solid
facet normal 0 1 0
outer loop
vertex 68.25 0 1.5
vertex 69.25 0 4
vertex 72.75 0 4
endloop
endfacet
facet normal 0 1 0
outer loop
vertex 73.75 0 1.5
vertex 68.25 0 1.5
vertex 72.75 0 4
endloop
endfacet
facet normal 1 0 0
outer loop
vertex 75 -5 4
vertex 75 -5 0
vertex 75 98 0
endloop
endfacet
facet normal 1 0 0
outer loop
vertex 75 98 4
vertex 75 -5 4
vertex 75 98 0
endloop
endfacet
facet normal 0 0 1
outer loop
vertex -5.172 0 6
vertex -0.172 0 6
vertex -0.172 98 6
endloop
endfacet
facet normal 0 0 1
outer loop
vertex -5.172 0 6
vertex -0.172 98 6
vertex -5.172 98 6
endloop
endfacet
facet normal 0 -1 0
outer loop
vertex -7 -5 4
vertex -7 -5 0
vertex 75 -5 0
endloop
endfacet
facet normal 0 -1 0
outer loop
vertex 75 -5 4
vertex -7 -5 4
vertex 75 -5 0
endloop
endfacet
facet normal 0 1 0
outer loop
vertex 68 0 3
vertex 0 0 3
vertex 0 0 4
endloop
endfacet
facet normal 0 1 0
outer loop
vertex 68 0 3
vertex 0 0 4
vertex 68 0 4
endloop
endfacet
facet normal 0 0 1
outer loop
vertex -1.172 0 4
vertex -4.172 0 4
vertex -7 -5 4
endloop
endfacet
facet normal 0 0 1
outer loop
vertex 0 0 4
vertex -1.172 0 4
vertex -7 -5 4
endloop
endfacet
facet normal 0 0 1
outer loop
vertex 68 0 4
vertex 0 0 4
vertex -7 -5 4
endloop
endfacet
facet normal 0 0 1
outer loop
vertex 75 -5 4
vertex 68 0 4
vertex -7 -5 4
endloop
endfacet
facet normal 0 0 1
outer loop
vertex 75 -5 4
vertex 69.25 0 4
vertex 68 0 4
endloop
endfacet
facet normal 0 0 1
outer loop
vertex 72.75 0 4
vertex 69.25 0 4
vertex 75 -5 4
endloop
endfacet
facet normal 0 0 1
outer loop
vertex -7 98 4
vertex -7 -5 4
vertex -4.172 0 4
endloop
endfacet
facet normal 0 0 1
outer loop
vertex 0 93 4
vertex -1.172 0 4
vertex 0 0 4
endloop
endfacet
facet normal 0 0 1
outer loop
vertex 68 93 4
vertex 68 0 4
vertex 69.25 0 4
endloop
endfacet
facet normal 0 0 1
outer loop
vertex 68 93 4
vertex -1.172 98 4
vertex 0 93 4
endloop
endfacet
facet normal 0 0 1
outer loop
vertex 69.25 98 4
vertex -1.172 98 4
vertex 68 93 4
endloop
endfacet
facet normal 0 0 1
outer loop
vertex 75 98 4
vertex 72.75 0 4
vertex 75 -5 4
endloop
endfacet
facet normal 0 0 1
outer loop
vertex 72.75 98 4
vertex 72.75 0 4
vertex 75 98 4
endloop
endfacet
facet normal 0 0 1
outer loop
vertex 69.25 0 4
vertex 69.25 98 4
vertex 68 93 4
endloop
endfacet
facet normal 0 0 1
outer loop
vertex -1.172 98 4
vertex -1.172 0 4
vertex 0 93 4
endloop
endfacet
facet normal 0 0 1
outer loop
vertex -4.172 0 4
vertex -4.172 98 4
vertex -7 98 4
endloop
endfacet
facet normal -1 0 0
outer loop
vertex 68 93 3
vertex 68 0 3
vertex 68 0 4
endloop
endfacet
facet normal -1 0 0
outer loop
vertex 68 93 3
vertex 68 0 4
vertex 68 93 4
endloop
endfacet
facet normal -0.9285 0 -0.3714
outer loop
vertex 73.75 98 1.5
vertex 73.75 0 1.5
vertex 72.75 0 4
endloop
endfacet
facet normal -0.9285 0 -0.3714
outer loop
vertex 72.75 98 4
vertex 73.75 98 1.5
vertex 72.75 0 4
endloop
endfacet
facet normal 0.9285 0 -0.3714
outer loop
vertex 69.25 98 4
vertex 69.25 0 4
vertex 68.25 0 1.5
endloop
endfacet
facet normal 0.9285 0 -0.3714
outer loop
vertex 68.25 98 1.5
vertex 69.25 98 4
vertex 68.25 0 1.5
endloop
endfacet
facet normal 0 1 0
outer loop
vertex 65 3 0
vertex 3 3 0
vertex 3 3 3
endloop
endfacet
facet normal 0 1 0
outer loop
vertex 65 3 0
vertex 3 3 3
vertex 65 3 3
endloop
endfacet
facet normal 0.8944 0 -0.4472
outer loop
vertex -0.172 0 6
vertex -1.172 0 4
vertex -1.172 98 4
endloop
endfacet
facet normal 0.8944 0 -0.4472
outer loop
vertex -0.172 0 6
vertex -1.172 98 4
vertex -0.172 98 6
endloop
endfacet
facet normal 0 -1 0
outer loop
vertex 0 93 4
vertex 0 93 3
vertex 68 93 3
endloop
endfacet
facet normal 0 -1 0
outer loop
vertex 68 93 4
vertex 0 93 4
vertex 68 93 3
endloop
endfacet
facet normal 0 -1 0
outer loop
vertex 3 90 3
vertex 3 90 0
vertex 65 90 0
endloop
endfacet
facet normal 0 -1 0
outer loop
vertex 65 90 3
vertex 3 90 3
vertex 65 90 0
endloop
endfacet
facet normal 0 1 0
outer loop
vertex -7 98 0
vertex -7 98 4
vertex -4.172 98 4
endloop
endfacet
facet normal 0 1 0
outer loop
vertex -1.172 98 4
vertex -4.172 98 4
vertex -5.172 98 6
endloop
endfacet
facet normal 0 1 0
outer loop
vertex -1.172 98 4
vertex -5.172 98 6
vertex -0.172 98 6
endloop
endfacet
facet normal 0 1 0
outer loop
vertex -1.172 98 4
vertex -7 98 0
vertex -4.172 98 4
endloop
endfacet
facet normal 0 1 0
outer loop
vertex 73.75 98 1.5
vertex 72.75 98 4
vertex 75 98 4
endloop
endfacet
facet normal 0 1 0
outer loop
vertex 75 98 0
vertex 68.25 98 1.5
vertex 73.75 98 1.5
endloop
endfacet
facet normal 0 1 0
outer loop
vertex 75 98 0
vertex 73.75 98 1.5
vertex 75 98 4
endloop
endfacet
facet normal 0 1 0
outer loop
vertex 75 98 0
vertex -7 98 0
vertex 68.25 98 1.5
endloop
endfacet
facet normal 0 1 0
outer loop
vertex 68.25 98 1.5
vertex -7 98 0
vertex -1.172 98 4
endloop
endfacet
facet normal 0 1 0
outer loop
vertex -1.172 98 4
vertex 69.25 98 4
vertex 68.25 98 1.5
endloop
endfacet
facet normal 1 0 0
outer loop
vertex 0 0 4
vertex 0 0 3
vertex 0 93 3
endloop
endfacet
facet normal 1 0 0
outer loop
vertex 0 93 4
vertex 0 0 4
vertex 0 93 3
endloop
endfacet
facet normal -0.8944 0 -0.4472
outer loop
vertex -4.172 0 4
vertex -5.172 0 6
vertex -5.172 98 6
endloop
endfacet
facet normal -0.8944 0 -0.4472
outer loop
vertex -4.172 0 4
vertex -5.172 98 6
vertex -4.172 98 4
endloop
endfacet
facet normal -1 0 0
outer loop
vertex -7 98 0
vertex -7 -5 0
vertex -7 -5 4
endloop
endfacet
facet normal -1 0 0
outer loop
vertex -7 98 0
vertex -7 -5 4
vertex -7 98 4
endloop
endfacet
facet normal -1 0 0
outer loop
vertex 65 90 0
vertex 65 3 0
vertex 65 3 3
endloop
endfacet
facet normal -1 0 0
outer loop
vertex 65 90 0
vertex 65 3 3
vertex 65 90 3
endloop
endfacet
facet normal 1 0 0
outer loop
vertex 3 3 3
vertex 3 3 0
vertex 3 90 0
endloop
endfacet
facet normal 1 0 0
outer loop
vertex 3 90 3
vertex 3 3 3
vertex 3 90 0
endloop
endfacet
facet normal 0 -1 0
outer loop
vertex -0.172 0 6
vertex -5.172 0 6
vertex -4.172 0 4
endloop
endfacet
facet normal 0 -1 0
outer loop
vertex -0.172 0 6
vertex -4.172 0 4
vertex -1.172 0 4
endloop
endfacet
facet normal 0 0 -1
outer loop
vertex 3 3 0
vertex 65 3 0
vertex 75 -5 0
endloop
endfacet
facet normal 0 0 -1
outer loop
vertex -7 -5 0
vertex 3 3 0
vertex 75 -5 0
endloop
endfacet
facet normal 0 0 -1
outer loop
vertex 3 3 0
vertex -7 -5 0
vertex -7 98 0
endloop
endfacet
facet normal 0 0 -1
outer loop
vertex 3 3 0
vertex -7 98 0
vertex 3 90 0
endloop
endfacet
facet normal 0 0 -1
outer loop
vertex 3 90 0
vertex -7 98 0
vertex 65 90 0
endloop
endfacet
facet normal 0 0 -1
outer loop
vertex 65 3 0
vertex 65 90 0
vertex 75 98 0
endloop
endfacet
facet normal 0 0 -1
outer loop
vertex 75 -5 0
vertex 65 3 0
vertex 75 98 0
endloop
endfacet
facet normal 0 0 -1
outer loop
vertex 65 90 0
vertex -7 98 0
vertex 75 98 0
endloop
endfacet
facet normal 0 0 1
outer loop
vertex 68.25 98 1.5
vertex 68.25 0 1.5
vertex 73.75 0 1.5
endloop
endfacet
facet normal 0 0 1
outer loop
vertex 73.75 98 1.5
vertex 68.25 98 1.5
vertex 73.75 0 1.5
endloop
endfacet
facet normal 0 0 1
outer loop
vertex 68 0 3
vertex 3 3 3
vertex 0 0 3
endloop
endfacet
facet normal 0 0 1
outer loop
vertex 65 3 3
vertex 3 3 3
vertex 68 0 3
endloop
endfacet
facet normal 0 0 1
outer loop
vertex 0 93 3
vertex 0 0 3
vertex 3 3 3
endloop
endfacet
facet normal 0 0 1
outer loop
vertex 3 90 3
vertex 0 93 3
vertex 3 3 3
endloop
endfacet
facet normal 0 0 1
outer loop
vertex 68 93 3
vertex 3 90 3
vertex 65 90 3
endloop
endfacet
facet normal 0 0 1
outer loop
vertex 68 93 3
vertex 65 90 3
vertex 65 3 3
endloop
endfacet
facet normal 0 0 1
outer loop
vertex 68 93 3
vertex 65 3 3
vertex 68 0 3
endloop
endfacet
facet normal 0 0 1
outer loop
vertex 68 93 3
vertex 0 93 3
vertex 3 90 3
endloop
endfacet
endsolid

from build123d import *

# Parameters (mm, degrees)
F0_W     = 68
F0_H     = 93
F0_W_2   = 62
F0_H_2   = 87
F1_DEPTH = 3
F0_W_3   = 82
F0_H_3   = 103
F2_DEPTH = 4
F4_DEPTH = 98
F6_DEPTH = 98


with BuildPart() as f1:
    # F0 (on Top) → F1 (new body)
    with BuildSketch(Plane.XY):
        with Locations((34, 46.5)):
            Rectangle(F0_W, F0_H)
        with Locations((34, 46.5)):
            Rectangle(F0_W_2, F0_H_2, mode=Mode.SUBTRACT)
    extrude(amount=F1_DEPTH)

    # F0 (on Top) → F2 (join)
    with BuildSketch(Plane.XY):
        with Locations((34, 46.5)):
            Rectangle(F0_W_3, F0_H_3)
        with Locations((34, 46.5)):
            Rectangle(F0_W, F0_H, mode=Mode.SUBTRACT)
    extrude(amount=F2_DEPTH)

    # F3 (on Front) → F4 (join)
    with BuildSketch(Plane.XZ):
        Polygon((-5.171573, 6), (-4.171573, 4), (-1.171573, 4), (-0.171573, 6), align=None)
    extrude(amount=-F4_DEPTH)

    # F5 (on Front) → F6 (cut)
    with BuildSketch(Plane.XZ):
        Polygon((72.75, 4), (69.25, 4), (68.25, 1.499999), (73.75, 1.499999), align=None)
    extrude(amount=-F6_DEPTH, mode=Mode.SUBTRACT)


solid = f1.part
